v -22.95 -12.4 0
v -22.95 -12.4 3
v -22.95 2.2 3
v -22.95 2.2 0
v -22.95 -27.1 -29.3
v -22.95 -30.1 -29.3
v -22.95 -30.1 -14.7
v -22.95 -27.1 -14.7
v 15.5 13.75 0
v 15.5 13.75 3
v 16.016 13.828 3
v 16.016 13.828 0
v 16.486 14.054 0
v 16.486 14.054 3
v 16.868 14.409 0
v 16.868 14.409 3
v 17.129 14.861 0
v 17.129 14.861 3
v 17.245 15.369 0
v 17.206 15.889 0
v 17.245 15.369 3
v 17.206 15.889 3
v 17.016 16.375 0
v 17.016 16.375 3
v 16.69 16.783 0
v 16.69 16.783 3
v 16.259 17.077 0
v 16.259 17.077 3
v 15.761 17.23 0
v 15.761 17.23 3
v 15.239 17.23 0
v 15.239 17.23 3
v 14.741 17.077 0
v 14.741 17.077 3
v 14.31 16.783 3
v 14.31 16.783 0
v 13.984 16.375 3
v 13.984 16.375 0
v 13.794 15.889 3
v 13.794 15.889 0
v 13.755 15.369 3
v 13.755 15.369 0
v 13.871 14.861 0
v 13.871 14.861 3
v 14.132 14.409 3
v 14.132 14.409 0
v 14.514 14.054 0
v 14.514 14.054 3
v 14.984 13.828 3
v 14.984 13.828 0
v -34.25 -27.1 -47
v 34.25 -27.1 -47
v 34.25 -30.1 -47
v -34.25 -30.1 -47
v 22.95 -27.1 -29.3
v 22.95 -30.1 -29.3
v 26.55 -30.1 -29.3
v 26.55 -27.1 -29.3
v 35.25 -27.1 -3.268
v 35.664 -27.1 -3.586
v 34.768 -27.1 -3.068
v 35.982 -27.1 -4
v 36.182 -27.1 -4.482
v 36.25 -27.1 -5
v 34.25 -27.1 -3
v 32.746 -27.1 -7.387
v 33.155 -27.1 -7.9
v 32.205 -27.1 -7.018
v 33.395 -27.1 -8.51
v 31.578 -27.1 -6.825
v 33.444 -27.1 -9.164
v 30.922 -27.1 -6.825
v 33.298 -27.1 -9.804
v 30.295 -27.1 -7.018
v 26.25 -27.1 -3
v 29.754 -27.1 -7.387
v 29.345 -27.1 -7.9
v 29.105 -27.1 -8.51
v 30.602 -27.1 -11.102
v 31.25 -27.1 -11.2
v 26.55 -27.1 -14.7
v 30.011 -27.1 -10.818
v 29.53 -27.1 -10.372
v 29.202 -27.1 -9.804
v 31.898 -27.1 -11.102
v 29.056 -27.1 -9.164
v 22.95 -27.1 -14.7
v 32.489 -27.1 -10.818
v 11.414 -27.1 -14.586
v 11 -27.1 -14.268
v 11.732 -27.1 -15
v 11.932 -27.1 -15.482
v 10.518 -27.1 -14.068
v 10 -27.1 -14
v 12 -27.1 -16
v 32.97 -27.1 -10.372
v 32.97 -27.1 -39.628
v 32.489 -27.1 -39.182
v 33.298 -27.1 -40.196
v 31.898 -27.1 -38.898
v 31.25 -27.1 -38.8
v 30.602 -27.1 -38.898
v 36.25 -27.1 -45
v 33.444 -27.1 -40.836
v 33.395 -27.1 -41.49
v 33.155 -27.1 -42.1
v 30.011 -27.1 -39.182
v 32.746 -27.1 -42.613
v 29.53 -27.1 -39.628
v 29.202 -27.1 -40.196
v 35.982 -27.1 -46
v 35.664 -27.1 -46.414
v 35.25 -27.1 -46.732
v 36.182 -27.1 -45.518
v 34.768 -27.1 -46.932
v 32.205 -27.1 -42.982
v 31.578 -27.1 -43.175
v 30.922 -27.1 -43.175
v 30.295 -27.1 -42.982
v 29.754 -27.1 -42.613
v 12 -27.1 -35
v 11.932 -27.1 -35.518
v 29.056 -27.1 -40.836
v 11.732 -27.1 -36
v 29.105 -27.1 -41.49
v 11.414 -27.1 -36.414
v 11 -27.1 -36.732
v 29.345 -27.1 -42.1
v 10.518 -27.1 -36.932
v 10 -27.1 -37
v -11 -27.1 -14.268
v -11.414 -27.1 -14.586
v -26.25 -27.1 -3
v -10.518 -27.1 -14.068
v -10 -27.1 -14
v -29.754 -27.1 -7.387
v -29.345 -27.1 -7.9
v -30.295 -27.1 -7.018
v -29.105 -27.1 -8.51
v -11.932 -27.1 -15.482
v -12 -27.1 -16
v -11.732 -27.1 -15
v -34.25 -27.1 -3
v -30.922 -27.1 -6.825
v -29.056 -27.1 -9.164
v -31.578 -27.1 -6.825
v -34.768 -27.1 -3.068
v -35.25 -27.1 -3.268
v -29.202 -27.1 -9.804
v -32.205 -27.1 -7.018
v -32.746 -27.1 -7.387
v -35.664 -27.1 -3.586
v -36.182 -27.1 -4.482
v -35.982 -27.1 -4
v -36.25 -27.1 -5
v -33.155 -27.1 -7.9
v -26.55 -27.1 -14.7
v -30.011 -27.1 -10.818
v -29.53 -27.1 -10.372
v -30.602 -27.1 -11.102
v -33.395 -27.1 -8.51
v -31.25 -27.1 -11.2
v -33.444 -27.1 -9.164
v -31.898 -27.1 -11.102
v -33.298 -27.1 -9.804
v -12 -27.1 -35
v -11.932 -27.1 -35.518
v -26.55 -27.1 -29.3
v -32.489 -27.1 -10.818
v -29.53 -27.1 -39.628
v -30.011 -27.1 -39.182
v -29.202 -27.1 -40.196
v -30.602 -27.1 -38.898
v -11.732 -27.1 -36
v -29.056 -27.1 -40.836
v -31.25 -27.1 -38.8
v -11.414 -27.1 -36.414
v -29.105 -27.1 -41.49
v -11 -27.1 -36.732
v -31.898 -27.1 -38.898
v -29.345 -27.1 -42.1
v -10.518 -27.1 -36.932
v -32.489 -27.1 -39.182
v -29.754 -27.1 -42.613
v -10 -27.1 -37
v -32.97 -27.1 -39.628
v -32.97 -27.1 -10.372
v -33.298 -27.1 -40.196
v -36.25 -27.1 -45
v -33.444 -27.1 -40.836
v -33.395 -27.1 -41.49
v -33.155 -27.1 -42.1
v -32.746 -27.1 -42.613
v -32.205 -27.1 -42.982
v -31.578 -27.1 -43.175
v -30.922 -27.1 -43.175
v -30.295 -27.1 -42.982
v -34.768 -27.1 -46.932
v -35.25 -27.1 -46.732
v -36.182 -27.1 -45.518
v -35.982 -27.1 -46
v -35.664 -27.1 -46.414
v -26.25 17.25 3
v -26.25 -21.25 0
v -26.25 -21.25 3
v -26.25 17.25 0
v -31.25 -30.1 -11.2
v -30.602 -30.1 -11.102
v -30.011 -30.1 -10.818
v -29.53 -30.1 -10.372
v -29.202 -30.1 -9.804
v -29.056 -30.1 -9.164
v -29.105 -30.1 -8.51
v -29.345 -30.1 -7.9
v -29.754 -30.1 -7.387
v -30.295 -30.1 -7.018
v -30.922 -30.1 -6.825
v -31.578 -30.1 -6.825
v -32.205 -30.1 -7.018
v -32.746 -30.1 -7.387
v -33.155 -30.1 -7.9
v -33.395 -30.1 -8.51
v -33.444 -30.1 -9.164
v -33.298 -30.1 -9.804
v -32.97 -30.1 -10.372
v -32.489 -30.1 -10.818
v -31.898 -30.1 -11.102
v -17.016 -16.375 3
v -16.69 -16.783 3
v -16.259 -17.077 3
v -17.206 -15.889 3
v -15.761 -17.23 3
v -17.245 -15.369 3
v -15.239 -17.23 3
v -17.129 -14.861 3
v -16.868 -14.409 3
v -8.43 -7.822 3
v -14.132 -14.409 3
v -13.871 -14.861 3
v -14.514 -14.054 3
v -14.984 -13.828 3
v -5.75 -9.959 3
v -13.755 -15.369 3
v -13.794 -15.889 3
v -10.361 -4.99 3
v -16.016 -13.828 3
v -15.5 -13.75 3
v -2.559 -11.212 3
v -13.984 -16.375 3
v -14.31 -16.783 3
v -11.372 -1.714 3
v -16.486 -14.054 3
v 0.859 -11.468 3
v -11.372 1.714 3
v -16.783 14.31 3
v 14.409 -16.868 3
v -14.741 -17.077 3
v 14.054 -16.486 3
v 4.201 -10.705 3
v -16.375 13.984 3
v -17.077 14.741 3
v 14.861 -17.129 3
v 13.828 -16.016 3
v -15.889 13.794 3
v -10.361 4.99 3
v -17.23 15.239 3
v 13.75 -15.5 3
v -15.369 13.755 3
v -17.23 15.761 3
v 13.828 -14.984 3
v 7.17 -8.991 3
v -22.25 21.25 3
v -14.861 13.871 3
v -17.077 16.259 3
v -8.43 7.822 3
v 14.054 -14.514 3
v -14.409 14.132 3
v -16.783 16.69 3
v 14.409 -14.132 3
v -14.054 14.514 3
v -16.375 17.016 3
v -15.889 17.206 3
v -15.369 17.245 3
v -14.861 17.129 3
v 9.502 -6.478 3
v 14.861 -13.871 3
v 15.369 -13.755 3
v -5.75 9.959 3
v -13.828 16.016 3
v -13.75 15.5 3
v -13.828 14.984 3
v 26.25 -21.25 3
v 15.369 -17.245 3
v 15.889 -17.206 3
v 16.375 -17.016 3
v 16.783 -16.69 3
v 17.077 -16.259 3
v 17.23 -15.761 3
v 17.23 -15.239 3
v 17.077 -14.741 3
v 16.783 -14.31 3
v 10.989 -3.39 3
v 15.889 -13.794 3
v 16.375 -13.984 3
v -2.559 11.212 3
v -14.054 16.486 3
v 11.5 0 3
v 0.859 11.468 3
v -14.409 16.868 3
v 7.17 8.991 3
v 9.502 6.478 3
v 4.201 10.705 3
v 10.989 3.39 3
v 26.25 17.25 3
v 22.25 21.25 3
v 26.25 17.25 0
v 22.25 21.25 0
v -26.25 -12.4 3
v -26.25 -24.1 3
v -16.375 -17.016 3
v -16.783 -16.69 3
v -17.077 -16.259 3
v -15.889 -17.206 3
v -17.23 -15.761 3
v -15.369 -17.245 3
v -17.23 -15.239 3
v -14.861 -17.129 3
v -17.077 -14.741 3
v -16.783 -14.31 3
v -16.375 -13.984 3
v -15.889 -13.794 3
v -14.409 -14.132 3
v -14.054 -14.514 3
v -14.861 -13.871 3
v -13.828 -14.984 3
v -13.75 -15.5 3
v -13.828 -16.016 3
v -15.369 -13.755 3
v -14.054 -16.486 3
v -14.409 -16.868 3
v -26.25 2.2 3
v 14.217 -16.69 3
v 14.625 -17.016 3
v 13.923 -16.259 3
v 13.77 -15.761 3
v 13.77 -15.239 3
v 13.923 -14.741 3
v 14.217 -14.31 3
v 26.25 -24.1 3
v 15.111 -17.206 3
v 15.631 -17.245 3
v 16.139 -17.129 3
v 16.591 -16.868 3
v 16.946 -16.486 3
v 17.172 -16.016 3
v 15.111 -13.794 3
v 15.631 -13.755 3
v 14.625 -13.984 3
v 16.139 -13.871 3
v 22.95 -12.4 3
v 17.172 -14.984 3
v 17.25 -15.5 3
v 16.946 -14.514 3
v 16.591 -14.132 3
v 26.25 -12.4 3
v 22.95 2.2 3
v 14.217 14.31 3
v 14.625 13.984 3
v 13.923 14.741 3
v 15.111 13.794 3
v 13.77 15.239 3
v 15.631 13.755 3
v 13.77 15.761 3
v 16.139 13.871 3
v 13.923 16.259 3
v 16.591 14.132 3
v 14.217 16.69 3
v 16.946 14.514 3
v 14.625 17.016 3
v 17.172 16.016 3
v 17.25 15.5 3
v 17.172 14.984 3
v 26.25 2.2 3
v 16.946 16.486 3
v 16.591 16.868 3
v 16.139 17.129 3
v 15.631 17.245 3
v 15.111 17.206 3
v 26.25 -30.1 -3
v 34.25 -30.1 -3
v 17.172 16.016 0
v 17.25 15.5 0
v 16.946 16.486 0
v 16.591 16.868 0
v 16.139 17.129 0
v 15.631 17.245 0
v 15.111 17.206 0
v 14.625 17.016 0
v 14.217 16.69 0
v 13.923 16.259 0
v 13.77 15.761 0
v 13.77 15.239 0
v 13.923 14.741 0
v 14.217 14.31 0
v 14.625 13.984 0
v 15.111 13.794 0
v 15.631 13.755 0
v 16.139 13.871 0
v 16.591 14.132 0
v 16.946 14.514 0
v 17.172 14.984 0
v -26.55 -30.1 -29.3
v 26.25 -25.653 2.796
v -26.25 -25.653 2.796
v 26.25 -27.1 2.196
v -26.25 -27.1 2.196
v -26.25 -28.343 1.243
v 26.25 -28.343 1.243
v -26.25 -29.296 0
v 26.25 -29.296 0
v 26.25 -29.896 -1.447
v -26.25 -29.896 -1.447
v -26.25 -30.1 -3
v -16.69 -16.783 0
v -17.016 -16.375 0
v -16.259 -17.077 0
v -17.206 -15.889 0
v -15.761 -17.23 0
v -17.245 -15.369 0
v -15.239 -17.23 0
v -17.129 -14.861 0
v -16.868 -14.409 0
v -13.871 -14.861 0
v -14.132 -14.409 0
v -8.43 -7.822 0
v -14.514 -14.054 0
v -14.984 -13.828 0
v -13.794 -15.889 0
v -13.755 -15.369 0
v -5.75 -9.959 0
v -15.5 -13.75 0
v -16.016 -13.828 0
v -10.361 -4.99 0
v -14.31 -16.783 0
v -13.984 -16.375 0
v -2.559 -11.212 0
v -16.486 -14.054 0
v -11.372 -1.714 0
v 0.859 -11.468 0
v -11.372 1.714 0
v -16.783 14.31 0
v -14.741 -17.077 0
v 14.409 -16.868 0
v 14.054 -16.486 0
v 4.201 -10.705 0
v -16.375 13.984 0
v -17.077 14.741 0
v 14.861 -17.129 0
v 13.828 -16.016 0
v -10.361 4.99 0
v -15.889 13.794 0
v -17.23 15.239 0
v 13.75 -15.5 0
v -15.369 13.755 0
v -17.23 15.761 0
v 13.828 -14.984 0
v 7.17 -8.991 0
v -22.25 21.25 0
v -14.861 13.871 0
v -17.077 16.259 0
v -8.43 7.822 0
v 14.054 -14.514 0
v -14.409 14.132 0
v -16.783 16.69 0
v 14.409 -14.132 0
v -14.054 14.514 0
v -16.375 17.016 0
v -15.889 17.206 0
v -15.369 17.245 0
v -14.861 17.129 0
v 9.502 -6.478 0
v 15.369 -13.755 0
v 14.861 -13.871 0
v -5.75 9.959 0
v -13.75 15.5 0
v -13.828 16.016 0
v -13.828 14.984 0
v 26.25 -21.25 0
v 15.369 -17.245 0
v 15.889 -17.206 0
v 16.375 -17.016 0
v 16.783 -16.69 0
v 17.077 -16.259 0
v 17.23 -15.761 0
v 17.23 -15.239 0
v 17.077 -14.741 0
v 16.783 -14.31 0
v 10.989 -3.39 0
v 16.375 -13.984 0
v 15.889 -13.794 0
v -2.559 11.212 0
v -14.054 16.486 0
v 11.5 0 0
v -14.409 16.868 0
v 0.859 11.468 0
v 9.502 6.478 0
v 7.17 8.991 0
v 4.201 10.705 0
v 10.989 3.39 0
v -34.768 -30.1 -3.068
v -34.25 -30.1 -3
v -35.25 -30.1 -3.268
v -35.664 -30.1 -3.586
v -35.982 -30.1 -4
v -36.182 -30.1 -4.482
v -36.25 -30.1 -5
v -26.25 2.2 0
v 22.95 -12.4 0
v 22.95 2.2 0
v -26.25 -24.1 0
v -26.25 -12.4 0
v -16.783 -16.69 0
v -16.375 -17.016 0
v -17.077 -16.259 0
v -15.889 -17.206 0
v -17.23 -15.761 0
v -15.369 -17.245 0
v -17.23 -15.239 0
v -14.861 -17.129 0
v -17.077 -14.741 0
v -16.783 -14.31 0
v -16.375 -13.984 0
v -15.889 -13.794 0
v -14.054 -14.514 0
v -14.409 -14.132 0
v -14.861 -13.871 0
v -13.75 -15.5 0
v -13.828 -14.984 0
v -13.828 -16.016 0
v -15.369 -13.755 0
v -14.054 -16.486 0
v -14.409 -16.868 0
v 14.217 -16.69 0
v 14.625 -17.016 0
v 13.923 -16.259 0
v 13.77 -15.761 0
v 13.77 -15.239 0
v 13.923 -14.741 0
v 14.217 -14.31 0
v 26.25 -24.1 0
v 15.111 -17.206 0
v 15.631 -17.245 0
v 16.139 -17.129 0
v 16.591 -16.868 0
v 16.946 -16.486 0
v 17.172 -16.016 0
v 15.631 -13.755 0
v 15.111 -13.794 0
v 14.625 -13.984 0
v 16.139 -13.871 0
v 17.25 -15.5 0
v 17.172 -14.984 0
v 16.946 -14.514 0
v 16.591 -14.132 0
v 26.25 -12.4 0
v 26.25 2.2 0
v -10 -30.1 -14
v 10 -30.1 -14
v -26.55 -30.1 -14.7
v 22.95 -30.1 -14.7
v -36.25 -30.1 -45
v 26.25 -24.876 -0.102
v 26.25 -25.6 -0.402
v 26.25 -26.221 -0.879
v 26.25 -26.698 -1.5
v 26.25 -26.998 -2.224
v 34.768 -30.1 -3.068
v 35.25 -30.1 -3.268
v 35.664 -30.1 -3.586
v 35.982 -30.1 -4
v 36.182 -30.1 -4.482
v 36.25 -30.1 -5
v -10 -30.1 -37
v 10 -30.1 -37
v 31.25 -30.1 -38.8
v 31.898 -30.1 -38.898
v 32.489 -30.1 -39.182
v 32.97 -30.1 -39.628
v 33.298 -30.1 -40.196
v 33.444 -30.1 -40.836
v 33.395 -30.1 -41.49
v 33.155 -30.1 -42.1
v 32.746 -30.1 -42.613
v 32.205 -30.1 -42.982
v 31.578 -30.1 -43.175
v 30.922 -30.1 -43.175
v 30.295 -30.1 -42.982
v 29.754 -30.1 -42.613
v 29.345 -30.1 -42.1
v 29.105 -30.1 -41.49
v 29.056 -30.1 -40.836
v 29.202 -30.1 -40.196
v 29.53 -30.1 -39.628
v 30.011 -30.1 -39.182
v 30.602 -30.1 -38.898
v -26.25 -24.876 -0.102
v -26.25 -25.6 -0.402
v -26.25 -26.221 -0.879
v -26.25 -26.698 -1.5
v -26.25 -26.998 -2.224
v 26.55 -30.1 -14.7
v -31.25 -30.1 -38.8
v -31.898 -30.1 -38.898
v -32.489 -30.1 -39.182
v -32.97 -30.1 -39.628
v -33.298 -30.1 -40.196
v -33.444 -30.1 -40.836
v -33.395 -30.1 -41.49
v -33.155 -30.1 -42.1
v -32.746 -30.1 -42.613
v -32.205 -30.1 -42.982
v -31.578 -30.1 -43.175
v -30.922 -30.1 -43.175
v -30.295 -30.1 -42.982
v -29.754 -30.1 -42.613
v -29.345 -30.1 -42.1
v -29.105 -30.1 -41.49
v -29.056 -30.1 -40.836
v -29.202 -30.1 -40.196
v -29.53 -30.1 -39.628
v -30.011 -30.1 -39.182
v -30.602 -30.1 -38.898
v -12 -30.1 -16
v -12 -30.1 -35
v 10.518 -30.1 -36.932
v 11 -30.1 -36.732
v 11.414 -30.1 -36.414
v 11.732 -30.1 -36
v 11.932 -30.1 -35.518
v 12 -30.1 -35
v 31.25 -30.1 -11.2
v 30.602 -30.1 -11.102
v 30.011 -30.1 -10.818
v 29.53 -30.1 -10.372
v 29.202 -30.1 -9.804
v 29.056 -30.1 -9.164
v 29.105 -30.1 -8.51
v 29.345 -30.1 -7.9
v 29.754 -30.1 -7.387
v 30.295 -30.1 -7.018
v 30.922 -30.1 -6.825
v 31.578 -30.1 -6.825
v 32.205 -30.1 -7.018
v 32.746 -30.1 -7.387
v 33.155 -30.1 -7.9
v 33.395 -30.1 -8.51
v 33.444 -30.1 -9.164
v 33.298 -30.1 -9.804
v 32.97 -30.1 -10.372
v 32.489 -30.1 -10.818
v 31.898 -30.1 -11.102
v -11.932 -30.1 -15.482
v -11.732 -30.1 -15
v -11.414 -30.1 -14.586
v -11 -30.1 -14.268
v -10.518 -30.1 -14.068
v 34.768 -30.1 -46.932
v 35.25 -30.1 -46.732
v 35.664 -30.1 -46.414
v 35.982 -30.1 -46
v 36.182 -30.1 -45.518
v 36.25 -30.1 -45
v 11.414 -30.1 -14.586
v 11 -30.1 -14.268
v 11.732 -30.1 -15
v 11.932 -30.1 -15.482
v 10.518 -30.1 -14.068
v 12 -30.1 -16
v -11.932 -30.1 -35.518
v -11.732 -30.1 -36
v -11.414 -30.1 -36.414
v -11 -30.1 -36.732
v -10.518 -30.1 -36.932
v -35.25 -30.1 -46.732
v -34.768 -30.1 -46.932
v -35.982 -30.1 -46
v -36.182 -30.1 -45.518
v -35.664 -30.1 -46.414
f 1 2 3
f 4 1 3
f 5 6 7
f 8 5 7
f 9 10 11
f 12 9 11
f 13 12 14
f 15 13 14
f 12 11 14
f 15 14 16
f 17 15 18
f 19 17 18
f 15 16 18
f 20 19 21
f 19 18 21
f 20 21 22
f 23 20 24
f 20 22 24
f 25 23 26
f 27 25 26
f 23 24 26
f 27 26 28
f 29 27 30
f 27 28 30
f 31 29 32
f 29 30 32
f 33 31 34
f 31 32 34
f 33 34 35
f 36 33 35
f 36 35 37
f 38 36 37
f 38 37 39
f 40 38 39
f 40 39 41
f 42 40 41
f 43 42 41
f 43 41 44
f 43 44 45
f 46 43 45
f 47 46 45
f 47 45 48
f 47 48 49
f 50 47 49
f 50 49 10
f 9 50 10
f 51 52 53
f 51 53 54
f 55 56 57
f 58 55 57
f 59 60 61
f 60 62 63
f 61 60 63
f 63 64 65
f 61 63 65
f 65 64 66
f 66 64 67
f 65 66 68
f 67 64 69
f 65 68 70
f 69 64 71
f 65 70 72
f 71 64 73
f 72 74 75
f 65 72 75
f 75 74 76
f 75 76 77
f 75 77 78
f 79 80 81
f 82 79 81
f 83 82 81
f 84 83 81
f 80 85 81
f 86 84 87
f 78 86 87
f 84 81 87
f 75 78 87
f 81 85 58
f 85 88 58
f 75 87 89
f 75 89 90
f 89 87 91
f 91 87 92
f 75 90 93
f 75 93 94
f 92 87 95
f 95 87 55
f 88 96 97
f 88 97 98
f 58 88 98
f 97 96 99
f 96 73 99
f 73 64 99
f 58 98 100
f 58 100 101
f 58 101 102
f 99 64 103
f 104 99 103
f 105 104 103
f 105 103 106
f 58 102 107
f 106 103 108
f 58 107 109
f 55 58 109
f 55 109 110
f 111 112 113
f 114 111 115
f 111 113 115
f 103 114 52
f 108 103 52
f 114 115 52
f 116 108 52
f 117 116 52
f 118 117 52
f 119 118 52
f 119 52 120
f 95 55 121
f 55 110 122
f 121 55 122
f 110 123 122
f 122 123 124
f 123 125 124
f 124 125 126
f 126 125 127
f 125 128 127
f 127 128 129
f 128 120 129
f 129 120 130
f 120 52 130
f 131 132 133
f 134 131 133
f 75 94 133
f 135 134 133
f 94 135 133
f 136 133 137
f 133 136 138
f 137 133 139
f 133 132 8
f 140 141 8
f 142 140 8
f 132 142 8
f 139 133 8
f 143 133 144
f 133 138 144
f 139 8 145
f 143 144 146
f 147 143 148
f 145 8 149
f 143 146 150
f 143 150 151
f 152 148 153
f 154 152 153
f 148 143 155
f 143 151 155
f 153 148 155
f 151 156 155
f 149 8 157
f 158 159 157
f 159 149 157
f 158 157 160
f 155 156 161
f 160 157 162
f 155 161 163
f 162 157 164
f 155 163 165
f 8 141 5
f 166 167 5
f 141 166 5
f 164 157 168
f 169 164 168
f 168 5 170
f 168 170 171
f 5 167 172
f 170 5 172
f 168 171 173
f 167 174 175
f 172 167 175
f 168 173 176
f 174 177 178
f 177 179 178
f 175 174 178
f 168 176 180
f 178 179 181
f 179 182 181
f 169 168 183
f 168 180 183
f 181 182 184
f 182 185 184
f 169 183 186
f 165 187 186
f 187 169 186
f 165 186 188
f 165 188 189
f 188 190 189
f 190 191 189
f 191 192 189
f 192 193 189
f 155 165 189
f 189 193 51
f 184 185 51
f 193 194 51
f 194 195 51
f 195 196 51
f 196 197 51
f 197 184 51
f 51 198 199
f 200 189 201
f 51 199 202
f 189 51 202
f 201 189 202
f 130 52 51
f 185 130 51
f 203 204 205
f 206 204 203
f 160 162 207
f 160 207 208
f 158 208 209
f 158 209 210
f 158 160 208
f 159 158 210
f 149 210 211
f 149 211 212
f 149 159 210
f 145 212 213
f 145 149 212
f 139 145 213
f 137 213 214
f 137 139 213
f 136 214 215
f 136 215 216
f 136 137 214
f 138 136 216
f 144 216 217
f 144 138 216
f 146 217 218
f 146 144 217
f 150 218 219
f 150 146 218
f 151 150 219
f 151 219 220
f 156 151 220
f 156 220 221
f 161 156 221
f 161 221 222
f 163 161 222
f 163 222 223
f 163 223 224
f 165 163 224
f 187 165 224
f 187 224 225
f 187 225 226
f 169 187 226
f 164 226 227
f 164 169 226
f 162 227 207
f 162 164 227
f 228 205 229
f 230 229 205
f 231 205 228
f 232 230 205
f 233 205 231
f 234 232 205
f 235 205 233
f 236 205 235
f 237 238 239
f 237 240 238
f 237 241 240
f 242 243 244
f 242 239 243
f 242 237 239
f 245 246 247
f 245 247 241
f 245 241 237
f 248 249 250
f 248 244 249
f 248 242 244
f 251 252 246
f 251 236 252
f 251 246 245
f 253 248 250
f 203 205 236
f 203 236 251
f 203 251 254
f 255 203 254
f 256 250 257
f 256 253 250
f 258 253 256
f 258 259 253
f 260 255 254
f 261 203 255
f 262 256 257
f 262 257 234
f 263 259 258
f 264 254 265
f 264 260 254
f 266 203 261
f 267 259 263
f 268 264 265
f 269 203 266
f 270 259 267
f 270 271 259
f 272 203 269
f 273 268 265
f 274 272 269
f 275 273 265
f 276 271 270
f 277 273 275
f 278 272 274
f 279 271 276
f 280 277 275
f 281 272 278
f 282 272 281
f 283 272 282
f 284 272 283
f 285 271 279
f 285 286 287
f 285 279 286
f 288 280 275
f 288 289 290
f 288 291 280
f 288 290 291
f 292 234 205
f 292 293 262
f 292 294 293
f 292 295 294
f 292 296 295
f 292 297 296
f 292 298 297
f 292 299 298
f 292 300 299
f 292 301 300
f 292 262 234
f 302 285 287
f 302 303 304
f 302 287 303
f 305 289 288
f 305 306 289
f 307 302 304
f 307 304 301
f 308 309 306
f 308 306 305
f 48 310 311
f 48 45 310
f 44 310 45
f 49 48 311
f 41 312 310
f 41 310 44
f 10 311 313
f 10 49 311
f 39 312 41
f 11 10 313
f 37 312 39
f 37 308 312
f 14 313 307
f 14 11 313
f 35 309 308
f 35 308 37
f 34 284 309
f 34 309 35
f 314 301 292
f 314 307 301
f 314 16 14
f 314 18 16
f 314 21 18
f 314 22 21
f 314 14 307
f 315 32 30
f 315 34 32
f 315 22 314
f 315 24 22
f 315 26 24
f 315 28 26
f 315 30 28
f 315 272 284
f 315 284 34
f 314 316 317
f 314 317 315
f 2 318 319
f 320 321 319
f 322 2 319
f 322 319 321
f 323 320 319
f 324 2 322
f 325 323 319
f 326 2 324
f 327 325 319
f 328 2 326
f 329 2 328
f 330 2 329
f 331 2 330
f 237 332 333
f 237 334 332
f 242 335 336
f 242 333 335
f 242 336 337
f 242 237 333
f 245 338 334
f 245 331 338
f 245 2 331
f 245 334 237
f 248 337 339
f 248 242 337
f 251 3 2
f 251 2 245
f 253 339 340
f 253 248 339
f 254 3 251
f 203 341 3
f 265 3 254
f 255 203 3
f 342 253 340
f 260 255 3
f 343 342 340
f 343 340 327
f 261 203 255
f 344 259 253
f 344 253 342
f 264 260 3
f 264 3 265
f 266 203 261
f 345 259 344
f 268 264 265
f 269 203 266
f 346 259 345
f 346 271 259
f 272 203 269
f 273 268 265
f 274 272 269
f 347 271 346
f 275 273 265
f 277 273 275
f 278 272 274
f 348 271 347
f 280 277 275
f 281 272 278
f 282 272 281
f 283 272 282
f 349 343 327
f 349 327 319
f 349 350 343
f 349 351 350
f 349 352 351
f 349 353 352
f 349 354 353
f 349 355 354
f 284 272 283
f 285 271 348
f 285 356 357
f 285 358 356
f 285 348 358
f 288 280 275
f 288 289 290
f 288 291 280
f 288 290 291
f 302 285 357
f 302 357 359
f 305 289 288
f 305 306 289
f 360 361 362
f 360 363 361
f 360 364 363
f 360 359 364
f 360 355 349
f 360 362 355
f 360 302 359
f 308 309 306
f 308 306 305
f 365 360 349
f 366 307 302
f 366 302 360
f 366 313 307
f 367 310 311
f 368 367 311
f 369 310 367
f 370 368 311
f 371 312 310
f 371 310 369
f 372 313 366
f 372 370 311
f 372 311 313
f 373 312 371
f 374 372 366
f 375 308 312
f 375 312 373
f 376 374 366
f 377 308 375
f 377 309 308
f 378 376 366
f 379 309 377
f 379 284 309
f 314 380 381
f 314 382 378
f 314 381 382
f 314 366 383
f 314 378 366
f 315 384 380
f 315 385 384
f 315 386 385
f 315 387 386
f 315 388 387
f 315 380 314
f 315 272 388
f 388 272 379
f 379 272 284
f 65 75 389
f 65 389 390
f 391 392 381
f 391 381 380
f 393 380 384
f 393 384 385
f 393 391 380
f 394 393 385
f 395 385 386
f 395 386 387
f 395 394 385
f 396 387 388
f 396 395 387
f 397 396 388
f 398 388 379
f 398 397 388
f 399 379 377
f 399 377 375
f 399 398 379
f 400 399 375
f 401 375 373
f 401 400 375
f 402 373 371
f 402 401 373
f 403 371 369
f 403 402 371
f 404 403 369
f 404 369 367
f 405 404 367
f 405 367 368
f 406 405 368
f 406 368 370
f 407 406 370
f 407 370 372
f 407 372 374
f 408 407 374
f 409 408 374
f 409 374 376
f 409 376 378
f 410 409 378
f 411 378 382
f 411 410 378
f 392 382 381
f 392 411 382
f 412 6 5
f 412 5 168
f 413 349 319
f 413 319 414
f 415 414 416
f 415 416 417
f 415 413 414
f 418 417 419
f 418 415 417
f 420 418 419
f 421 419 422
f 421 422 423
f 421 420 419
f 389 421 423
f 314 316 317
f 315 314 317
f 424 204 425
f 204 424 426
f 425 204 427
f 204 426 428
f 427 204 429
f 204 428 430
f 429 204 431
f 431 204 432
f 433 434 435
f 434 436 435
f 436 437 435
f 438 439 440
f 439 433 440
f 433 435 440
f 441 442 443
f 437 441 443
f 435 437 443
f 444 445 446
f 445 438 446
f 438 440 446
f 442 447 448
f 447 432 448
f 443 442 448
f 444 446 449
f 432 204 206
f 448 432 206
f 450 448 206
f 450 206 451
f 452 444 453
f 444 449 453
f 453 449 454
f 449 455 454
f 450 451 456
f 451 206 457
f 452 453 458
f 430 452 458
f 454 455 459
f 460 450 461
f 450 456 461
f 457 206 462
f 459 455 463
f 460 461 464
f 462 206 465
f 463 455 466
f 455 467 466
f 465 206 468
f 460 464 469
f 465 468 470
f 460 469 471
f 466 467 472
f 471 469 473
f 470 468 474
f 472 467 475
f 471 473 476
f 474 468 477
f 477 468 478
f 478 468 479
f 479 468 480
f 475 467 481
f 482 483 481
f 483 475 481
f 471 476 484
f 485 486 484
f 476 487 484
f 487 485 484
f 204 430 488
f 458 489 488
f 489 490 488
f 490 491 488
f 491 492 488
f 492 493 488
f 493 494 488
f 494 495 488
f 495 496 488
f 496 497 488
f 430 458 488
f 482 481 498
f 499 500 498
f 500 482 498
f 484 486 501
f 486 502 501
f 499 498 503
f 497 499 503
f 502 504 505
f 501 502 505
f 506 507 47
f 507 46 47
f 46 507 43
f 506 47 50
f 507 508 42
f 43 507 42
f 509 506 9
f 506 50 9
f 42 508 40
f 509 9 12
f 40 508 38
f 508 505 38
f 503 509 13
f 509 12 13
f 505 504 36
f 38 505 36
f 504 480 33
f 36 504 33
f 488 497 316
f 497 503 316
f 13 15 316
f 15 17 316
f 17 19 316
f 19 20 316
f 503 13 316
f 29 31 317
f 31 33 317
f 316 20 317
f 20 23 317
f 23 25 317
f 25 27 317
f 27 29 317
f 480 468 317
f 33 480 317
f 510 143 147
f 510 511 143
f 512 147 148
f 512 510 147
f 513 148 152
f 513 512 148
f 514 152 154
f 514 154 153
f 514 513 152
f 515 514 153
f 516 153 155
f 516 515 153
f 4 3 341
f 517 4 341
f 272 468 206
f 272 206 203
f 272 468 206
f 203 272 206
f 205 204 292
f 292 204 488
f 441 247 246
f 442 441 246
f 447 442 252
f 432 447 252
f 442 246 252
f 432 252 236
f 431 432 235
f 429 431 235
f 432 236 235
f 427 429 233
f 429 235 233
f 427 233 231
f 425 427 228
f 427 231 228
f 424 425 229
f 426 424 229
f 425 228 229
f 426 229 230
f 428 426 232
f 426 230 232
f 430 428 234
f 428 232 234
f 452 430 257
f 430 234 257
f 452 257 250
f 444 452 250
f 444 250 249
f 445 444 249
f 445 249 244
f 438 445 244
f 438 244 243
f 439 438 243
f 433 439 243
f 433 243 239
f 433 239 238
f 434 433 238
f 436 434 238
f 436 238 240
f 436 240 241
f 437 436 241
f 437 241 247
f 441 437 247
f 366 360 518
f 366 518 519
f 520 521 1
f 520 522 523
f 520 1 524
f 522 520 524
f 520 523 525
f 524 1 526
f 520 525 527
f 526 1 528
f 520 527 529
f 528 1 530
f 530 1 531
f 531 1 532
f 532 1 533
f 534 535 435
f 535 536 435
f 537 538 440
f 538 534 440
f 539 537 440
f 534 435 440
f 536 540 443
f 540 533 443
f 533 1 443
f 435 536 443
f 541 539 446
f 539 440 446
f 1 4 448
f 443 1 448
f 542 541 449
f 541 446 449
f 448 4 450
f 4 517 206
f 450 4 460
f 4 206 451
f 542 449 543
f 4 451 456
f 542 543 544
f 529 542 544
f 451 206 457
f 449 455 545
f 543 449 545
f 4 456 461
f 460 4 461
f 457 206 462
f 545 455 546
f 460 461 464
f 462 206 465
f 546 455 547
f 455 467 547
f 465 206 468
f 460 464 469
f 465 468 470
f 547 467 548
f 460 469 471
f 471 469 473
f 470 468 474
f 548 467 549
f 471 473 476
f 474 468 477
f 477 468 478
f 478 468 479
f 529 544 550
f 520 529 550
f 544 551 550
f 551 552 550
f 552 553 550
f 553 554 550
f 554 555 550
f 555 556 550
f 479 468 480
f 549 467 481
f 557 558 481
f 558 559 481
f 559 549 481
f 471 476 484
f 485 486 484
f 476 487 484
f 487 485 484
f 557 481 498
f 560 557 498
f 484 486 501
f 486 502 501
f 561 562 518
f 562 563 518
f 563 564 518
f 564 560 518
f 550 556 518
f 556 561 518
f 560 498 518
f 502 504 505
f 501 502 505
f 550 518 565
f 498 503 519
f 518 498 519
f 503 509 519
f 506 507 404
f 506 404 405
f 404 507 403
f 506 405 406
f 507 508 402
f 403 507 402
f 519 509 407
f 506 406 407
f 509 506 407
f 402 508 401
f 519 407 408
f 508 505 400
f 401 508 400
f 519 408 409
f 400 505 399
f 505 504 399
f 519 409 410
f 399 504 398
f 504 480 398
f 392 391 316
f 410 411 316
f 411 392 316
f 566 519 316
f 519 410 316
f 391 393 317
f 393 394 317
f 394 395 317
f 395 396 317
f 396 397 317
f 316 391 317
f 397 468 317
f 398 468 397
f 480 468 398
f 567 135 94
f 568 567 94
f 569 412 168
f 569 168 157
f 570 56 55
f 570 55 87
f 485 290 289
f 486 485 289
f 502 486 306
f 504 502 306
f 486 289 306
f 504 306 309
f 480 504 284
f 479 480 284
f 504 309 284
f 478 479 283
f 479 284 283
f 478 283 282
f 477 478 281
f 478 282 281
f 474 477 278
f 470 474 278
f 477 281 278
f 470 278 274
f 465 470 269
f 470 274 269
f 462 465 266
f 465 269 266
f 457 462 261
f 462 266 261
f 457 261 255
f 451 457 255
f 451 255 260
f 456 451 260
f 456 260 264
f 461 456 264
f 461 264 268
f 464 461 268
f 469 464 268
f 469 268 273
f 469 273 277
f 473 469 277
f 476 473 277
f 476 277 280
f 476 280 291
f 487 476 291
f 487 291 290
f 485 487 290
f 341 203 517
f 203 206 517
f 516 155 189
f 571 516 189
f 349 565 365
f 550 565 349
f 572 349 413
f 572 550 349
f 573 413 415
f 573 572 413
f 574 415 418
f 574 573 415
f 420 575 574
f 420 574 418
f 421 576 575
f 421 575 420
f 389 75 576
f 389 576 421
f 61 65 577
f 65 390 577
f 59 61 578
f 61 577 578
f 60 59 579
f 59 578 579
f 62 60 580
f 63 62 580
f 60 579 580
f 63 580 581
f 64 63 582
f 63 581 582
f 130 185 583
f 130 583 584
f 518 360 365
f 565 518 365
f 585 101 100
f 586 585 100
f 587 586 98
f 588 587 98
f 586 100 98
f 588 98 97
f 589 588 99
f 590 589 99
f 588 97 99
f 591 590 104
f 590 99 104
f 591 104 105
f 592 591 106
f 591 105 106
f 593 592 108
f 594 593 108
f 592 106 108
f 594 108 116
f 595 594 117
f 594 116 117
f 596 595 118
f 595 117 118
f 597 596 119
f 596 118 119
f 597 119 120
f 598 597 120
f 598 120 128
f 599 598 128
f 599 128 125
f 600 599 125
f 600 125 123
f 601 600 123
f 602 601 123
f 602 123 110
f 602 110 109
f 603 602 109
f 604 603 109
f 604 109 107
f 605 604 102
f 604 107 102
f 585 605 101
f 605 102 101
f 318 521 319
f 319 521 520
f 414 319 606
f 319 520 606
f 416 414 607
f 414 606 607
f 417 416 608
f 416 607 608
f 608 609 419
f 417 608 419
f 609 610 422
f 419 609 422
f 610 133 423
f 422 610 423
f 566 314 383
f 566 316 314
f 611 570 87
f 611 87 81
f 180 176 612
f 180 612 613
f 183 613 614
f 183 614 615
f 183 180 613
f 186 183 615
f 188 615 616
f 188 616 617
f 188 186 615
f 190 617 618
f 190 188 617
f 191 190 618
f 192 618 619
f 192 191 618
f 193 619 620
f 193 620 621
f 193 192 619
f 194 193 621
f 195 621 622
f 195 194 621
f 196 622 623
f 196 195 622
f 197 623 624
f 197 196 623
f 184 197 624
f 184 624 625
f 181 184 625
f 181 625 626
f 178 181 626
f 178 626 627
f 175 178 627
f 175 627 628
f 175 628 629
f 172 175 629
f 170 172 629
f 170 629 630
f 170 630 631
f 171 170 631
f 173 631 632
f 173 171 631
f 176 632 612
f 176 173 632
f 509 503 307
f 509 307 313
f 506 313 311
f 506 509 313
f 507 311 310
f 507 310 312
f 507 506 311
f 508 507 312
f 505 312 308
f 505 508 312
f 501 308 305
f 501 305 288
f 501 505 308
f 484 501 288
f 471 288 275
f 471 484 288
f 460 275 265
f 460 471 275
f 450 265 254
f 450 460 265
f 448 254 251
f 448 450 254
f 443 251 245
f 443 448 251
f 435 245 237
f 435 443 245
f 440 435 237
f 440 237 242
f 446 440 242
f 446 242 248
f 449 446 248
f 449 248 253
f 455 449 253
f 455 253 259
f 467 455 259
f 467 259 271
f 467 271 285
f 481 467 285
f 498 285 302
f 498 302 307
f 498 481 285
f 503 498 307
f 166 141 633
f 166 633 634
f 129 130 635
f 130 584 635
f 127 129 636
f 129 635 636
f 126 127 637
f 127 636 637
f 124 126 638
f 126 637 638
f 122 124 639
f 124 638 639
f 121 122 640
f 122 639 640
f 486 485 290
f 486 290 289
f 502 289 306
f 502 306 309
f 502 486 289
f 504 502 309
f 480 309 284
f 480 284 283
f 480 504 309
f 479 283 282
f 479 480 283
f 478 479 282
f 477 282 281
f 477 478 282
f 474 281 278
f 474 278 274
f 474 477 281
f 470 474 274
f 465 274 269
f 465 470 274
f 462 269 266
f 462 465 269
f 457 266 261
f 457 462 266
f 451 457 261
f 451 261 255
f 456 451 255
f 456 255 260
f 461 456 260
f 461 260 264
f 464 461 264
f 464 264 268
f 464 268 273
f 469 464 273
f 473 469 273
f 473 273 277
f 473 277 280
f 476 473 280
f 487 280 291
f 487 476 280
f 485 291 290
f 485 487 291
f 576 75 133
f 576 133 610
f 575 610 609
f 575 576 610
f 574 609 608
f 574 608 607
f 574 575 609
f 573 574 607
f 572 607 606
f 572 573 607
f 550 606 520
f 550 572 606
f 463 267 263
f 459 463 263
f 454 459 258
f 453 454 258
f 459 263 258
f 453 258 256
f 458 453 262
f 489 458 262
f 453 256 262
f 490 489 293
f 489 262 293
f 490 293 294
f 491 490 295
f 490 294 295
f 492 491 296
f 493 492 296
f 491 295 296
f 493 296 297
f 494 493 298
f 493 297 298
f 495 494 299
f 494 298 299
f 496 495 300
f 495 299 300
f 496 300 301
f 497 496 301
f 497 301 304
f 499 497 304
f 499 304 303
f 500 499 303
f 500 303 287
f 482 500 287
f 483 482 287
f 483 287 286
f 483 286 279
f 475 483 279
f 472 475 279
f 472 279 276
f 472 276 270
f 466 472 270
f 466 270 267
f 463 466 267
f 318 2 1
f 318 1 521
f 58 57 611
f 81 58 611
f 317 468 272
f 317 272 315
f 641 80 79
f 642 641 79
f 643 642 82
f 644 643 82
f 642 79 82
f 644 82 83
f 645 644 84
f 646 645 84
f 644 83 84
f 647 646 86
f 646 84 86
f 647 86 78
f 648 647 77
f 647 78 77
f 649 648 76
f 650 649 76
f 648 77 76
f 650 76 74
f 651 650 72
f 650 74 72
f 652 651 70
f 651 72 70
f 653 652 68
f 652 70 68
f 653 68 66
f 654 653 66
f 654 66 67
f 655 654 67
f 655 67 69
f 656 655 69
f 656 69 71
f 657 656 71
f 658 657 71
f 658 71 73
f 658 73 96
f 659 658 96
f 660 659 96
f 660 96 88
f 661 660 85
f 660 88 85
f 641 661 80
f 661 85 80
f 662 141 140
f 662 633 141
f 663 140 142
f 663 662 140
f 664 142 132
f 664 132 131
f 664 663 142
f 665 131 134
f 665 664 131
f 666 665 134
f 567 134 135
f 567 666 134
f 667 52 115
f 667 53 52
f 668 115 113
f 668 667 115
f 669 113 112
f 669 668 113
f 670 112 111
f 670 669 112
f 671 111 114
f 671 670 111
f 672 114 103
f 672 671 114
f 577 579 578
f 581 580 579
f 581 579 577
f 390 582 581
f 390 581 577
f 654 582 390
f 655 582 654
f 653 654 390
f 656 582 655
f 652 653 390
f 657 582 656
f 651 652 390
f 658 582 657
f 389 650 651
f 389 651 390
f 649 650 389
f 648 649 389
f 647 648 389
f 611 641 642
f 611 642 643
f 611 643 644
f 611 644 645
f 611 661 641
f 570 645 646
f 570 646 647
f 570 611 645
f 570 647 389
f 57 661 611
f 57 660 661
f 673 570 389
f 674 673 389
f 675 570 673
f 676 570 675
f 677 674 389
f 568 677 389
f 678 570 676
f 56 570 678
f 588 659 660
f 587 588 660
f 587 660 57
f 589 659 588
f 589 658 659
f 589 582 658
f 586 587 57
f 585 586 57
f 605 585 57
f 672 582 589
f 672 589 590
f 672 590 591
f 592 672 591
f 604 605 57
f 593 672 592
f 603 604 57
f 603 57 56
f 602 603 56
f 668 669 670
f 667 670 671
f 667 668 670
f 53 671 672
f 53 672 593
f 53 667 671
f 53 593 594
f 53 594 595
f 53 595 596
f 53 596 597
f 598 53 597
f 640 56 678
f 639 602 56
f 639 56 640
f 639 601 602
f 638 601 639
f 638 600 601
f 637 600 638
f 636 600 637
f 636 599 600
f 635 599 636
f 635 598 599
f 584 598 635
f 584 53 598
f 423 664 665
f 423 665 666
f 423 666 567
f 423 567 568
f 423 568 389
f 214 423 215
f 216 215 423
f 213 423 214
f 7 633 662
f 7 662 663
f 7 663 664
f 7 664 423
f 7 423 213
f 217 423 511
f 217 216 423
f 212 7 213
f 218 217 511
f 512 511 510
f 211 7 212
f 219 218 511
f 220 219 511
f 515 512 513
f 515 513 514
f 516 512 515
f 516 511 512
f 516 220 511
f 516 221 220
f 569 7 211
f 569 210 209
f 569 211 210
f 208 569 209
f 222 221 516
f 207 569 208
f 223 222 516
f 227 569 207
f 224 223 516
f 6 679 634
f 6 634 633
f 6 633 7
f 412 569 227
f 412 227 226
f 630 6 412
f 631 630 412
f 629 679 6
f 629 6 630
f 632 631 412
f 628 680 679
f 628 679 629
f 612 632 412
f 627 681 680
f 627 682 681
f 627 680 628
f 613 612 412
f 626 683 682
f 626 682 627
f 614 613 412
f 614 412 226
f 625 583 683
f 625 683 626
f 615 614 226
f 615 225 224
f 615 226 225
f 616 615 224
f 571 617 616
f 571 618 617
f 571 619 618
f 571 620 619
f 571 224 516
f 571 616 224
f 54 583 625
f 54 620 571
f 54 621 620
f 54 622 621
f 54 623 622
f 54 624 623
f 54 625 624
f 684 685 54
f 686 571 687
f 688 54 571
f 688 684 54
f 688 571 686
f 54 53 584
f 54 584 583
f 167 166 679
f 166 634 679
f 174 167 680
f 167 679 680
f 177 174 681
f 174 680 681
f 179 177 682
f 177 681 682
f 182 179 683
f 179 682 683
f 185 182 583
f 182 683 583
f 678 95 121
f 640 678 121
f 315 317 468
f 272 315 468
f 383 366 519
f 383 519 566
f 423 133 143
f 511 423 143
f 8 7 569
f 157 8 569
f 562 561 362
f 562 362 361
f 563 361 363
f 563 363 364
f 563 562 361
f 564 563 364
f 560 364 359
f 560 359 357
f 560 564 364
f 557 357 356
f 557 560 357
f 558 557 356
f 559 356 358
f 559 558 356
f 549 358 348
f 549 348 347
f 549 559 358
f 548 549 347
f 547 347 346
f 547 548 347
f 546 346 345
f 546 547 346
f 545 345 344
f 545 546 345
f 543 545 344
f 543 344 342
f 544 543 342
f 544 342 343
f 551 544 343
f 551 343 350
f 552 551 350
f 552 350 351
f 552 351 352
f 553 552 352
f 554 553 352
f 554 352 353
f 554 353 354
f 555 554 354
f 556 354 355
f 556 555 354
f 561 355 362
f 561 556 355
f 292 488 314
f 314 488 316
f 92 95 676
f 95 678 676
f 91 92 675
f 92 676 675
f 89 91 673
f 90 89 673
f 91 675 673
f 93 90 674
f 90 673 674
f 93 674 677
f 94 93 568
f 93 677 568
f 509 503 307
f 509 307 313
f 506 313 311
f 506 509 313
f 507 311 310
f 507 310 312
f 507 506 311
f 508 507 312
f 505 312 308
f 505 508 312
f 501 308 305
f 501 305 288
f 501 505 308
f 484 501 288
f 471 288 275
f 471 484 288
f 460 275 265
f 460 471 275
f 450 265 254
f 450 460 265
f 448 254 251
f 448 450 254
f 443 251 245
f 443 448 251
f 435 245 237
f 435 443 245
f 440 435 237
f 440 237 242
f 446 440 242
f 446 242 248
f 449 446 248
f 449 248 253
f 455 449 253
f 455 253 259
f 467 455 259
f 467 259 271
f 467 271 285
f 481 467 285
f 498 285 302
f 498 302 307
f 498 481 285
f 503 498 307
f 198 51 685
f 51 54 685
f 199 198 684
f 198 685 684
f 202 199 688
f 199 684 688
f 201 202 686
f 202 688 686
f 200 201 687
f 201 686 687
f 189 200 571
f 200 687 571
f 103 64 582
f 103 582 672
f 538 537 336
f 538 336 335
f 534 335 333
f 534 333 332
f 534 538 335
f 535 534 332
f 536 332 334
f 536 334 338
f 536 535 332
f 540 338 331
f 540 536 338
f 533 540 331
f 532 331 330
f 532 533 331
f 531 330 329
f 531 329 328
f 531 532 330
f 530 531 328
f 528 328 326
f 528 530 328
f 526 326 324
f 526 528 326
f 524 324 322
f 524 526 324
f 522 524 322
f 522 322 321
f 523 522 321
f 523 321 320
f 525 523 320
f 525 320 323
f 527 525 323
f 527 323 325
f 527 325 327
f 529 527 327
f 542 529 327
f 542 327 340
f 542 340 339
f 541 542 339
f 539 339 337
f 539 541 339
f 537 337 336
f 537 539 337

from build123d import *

# Parameters (mm, degrees)
SKETCH1_W                    = 52.5
SKETCH1_H                    = 42.5
SKETCH1_R                    = 11.5
BOSS_EXTRUDE1_DEPTH          = 3
CHAMFER1_SIZE                = 4
CUT_EXTRUDE1_REACH           = 35.906
SKETCH3_R                    = 1.75
CIRPATTERN1_COUNT            = 4
CONVERT_SOLID1_OUTLINE_R     = 1.75
CONVERT_SOLID1_OUTLINE_R_2   = 11.5
CONVERT_SOLID1_DEPTH         = 3
SKETCH4_W                    = 52.5
SKETCH4_H                    = 5.85
BASE_FLANGE1_DEPTH           = 3
EDGE_FLANGE1_STRIP_W         = 18
EDGE_FLANGE1_STRIP_H         = 3
EDGE_FLANGE1_STRIP_CUT_DEPTH = 52.5
EDGE_FLANGE1_DEPTH           = 52.5
SKETCH15_W                   = 24
SKETCH15_H                   = 23
CUT_EXTRUDE2_DEPTH           = 3
FILLET3_R                    = 2
SKETCH12_W                   = 10
SKETCH12_H                   = 44
SKETCH12_R                   = 2.2
TAB1_DEPTH                   = 3
FILLET1_R                    = 2
FILLET1_OF_MIRROR1_R         = 2
SKETCH16_W                   = 3.6
SKETCH16_H                   = 14.6
CUT_EXTRUDE3_DEPTH           = 10
SKETCH17_W                   = 3.6
SKETCH17_H                   = 14.6
CUT_EXTRUDE4_DEPTH           = 3


# Read off the part's stored shape, not the designer's step: Convert-Solid1
# Sheet-metal steps are written as plain solids
with BuildPart() as part:
    # Sketch1 → Boss-Extrude1 (new body)
    with BuildSketch(Plane.XY):
        Rectangle(SKETCH1_W, SKETCH1_H)
        Circle(SKETCH1_R, mode=Mode.SUBTRACT)
    extrude(amount=BOSS_EXTRUDE1_DEPTH)

    # Chamfer1
    chamfer1_edges = [part.edges().sort_by_distance(p)[0] for p in [
        (-26.25, 21.25, 1.5),
        (26.25, 21.25, 1.5),
    ]]
    chamfer(chamfer1_edges, length=CHAMFER1_SIZE)

    # Sketch3 → Cut-Extrude1 (cut, up to next)
    with BuildSketch(Plane.XY.offset(3), mode=Mode.PRIVATE) as cut_extrude1_sk1:
        with Locations((-15.5, 15.5)):
            Circle(SKETCH3_R)
    cut_extrude1_tool1 = extrude(cut_extrude1_sk1.sketch, amount=-CUT_EXTRUDE1_REACH, mode=Mode.PRIVATE) & part.part
    cut_extrude1 = cut_extrude1_tool1.solids().sort_by_distance((-15.5, 15.5, 3))[0]
    add(cut_extrude1, mode=Mode.SUBTRACT)

    # CirPattern1: Cut-Extrude1 ×4 about axis
    cirpattern1_axis = Axis((0, 0, 0), (0, 0, 1))
    for i in range(1, CIRPATTERN1_COUNT):
        add(cut_extrude1.rotate(cirpattern1_axis, i * 360 / CIRPATTERN1_COUNT), mode=Mode.SUBTRACT)


with BuildPart() as body_2:
    # Convert-Solid1 outline → Convert-Solid1 (new body)
    with BuildSketch(Plane.XY):
        Polygon((-22.25, 21.25), (-26.25, 17.25), (-26.25, -21.25), (26.25, -21.25), (26.25, 17.25), (22.25, 21.25), align=None)
        with Locations((-15.5, -15.5)):
            Circle(CONVERT_SOLID1_OUTLINE_R, mode=Mode.SUBTRACT)
        with Locations((15.5, -15.5)):
            Circle(CONVERT_SOLID1_OUTLINE_R, mode=Mode.SUBTRACT)
        with Locations((-15.5, 15.5)):
            Circle(CONVERT_SOLID1_OUTLINE_R, mode=Mode.SUBTRACT)
        Circle(CONVERT_SOLID1_OUTLINE_R_2, mode=Mode.SUBTRACT)
        with Locations((15.5, 15.5)):
            Circle(CONVERT_SOLID1_OUTLINE_R, mode=Mode.SUBTRACT)
    extrude(amount=CONVERT_SOLID1_DEPTH)


with BuildPart() as body_3:
    # Sketch4 → Base-Flange1 (new body)
    with BuildSketch(Plane(origin=(0, 0, 0), x_dir=(-1, 0, 0), z_dir=(0, 0, -1))):
        with Locations((0, -24.175)):
            Rectangle(SKETCH4_W, SKETCH4_H)
    extrude(amount=-BASE_FLANGE1_DEPTH)

    # Combine1: union body 2
    add(body_2.part)

    # Edge-Flange1 strip (across the edge) → Edge-Flange1 strip cut (cut)
    with BuildSketch(Plane(origin=(26.25, -27.1, 0), x_dir=(0, 1, 0), z_dir=(-1, 0, 0))):
        with Locations((-6, -1.5)):
            Rectangle(EDGE_FLANGE1_STRIP_W, EDGE_FLANGE1_STRIP_H)
    extrude(amount=EDGE_FLANGE1_STRIP_CUT_DEPTH, mode=Mode.SUBTRACT)

    # Edge-Flange1 section (across the edge) → Edge-Flange1 (add)
    with BuildSketch(Plane(origin=(26.25, -27.1, 0), x_dir=(0, 1, 0), z_dir=(-1, 0, 0))):
        with BuildLine():
            Line((-3, 3), (-3, 47))
            Line((-3, 47), (0, 47))
            Line((0, 47), (0, 3))
            ThreePointArc((0, 3), (0.878679656, 0.878679656), (3, 0))
            Line((3, 0), (3, -3))
            ThreePointArc((3, -3), (-1.242640687, -1.242640687), (-3, 3))
        make_face()
    extrude(amount=EDGE_FLANGE1_DEPTH)

    # Sketch15 → Cut-Extrude2 (cut)
    with BuildSketch(Plane(origin=(0, -27.1, 0), x_dir=(1, 0, 0), z_dir=(0, 1, 0))):
        with Locations((0, 25.5)):
            Rectangle(SKETCH15_W, SKETCH15_H)
    extrude(amount=-CUT_EXTRUDE2_DEPTH, mode=Mode.SUBTRACT)

    # Fillet3
    fillet3_edges = [body_3.edges().sort_by_distance(p)[0] for p in [
        (-12, -28.6, -14),
        (-12, -28.6, -37),
        (12, -28.6, -37),
        (12, -28.6, -14),
    ]]
    fillet(fillet3_edges, radius=FILLET3_R)

    # Sketch12 → Tab1 (add)
    with BuildSketch(Plane(origin=(0, -27.1, 0), x_dir=(1, 0, 0), z_dir=(0, 1, 0))):
        with Locations((31.25, 25)):
            Rectangle(SKETCH12_W, SKETCH12_H)
        with Locations(Location((31.25, 41, 0), (0, 0, 270))):
            Circle(SKETCH12_R, mode=Mode.SUBTRACT)
        with Locations(Location((31.25, 9, 0), (0, 0, 90))):
            Circle(SKETCH12_R, mode=Mode.SUBTRACT)
    tab1 = extrude(amount=-TAB1_DEPTH)

    # Fillet1
    fillet1_edges = [body_3.edges().sort_by_distance(p)[0] for p in [
        (36.25, -28.6, -47),
        (36.25, -28.6, -3),
    ]]
    fillet(fillet1_edges, radius=FILLET1_R)

    # Mirror1: Tab1 across plane
    add(tab1.mirror(Plane(origin=(0, 0, 0), x_dir=(0, 0, 1), z_dir=(1, 0, 0))))

    # Fillet1 of Mirror1
    fillet1_of_mirror1_edges = [body_3.edges().sort_by_distance(p)[0] for p in [
        (-36.25, -28.6, -47),
        (-36.25, -28.6, -3),
    ]]
    fillet(fillet1_of_mirror1_edges, radius=FILLET1_OF_MIRROR1_R)

    # Sketch16 → Cut-Extrude3 (cut)
    with BuildSketch(Plane.XY.offset(3)):
        with Locations((24.75, -5.1)):
            Rectangle(SKETCH16_W, SKETCH16_H)
    cut_extrude3 = extrude(amount=-CUT_EXTRUDE3_DEPTH, mode=Mode.SUBTRACT)

    # Mirror2: Cut-Extrude3 across plane
    add(cut_extrude3.mirror(Plane(origin=(0, 0, 0), x_dir=(0, 0, 1), z_dir=(1, 0, 0))), mode=Mode.SUBTRACT)

    # Sketch17 → Cut-Extrude4 (cut)
    with BuildSketch(Plane.XZ.offset(30.1)):
        with Locations((24.75, -22)):
            Rectangle(SKETCH17_W, SKETCH17_H)
    cut_extrude4 = extrude(amount=-CUT_EXTRUDE4_DEPTH, mode=Mode.SUBTRACT)

    # Mirror3: Cut-Extrude4 across plane
    add(cut_extrude4.mirror(Plane(origin=(0, 0, 0), x_dir=(0, 0, 1), z_dir=(1, 0, 0))), mode=Mode.SUBTRACT)


solid = Compound([part.part, body_3.part])
